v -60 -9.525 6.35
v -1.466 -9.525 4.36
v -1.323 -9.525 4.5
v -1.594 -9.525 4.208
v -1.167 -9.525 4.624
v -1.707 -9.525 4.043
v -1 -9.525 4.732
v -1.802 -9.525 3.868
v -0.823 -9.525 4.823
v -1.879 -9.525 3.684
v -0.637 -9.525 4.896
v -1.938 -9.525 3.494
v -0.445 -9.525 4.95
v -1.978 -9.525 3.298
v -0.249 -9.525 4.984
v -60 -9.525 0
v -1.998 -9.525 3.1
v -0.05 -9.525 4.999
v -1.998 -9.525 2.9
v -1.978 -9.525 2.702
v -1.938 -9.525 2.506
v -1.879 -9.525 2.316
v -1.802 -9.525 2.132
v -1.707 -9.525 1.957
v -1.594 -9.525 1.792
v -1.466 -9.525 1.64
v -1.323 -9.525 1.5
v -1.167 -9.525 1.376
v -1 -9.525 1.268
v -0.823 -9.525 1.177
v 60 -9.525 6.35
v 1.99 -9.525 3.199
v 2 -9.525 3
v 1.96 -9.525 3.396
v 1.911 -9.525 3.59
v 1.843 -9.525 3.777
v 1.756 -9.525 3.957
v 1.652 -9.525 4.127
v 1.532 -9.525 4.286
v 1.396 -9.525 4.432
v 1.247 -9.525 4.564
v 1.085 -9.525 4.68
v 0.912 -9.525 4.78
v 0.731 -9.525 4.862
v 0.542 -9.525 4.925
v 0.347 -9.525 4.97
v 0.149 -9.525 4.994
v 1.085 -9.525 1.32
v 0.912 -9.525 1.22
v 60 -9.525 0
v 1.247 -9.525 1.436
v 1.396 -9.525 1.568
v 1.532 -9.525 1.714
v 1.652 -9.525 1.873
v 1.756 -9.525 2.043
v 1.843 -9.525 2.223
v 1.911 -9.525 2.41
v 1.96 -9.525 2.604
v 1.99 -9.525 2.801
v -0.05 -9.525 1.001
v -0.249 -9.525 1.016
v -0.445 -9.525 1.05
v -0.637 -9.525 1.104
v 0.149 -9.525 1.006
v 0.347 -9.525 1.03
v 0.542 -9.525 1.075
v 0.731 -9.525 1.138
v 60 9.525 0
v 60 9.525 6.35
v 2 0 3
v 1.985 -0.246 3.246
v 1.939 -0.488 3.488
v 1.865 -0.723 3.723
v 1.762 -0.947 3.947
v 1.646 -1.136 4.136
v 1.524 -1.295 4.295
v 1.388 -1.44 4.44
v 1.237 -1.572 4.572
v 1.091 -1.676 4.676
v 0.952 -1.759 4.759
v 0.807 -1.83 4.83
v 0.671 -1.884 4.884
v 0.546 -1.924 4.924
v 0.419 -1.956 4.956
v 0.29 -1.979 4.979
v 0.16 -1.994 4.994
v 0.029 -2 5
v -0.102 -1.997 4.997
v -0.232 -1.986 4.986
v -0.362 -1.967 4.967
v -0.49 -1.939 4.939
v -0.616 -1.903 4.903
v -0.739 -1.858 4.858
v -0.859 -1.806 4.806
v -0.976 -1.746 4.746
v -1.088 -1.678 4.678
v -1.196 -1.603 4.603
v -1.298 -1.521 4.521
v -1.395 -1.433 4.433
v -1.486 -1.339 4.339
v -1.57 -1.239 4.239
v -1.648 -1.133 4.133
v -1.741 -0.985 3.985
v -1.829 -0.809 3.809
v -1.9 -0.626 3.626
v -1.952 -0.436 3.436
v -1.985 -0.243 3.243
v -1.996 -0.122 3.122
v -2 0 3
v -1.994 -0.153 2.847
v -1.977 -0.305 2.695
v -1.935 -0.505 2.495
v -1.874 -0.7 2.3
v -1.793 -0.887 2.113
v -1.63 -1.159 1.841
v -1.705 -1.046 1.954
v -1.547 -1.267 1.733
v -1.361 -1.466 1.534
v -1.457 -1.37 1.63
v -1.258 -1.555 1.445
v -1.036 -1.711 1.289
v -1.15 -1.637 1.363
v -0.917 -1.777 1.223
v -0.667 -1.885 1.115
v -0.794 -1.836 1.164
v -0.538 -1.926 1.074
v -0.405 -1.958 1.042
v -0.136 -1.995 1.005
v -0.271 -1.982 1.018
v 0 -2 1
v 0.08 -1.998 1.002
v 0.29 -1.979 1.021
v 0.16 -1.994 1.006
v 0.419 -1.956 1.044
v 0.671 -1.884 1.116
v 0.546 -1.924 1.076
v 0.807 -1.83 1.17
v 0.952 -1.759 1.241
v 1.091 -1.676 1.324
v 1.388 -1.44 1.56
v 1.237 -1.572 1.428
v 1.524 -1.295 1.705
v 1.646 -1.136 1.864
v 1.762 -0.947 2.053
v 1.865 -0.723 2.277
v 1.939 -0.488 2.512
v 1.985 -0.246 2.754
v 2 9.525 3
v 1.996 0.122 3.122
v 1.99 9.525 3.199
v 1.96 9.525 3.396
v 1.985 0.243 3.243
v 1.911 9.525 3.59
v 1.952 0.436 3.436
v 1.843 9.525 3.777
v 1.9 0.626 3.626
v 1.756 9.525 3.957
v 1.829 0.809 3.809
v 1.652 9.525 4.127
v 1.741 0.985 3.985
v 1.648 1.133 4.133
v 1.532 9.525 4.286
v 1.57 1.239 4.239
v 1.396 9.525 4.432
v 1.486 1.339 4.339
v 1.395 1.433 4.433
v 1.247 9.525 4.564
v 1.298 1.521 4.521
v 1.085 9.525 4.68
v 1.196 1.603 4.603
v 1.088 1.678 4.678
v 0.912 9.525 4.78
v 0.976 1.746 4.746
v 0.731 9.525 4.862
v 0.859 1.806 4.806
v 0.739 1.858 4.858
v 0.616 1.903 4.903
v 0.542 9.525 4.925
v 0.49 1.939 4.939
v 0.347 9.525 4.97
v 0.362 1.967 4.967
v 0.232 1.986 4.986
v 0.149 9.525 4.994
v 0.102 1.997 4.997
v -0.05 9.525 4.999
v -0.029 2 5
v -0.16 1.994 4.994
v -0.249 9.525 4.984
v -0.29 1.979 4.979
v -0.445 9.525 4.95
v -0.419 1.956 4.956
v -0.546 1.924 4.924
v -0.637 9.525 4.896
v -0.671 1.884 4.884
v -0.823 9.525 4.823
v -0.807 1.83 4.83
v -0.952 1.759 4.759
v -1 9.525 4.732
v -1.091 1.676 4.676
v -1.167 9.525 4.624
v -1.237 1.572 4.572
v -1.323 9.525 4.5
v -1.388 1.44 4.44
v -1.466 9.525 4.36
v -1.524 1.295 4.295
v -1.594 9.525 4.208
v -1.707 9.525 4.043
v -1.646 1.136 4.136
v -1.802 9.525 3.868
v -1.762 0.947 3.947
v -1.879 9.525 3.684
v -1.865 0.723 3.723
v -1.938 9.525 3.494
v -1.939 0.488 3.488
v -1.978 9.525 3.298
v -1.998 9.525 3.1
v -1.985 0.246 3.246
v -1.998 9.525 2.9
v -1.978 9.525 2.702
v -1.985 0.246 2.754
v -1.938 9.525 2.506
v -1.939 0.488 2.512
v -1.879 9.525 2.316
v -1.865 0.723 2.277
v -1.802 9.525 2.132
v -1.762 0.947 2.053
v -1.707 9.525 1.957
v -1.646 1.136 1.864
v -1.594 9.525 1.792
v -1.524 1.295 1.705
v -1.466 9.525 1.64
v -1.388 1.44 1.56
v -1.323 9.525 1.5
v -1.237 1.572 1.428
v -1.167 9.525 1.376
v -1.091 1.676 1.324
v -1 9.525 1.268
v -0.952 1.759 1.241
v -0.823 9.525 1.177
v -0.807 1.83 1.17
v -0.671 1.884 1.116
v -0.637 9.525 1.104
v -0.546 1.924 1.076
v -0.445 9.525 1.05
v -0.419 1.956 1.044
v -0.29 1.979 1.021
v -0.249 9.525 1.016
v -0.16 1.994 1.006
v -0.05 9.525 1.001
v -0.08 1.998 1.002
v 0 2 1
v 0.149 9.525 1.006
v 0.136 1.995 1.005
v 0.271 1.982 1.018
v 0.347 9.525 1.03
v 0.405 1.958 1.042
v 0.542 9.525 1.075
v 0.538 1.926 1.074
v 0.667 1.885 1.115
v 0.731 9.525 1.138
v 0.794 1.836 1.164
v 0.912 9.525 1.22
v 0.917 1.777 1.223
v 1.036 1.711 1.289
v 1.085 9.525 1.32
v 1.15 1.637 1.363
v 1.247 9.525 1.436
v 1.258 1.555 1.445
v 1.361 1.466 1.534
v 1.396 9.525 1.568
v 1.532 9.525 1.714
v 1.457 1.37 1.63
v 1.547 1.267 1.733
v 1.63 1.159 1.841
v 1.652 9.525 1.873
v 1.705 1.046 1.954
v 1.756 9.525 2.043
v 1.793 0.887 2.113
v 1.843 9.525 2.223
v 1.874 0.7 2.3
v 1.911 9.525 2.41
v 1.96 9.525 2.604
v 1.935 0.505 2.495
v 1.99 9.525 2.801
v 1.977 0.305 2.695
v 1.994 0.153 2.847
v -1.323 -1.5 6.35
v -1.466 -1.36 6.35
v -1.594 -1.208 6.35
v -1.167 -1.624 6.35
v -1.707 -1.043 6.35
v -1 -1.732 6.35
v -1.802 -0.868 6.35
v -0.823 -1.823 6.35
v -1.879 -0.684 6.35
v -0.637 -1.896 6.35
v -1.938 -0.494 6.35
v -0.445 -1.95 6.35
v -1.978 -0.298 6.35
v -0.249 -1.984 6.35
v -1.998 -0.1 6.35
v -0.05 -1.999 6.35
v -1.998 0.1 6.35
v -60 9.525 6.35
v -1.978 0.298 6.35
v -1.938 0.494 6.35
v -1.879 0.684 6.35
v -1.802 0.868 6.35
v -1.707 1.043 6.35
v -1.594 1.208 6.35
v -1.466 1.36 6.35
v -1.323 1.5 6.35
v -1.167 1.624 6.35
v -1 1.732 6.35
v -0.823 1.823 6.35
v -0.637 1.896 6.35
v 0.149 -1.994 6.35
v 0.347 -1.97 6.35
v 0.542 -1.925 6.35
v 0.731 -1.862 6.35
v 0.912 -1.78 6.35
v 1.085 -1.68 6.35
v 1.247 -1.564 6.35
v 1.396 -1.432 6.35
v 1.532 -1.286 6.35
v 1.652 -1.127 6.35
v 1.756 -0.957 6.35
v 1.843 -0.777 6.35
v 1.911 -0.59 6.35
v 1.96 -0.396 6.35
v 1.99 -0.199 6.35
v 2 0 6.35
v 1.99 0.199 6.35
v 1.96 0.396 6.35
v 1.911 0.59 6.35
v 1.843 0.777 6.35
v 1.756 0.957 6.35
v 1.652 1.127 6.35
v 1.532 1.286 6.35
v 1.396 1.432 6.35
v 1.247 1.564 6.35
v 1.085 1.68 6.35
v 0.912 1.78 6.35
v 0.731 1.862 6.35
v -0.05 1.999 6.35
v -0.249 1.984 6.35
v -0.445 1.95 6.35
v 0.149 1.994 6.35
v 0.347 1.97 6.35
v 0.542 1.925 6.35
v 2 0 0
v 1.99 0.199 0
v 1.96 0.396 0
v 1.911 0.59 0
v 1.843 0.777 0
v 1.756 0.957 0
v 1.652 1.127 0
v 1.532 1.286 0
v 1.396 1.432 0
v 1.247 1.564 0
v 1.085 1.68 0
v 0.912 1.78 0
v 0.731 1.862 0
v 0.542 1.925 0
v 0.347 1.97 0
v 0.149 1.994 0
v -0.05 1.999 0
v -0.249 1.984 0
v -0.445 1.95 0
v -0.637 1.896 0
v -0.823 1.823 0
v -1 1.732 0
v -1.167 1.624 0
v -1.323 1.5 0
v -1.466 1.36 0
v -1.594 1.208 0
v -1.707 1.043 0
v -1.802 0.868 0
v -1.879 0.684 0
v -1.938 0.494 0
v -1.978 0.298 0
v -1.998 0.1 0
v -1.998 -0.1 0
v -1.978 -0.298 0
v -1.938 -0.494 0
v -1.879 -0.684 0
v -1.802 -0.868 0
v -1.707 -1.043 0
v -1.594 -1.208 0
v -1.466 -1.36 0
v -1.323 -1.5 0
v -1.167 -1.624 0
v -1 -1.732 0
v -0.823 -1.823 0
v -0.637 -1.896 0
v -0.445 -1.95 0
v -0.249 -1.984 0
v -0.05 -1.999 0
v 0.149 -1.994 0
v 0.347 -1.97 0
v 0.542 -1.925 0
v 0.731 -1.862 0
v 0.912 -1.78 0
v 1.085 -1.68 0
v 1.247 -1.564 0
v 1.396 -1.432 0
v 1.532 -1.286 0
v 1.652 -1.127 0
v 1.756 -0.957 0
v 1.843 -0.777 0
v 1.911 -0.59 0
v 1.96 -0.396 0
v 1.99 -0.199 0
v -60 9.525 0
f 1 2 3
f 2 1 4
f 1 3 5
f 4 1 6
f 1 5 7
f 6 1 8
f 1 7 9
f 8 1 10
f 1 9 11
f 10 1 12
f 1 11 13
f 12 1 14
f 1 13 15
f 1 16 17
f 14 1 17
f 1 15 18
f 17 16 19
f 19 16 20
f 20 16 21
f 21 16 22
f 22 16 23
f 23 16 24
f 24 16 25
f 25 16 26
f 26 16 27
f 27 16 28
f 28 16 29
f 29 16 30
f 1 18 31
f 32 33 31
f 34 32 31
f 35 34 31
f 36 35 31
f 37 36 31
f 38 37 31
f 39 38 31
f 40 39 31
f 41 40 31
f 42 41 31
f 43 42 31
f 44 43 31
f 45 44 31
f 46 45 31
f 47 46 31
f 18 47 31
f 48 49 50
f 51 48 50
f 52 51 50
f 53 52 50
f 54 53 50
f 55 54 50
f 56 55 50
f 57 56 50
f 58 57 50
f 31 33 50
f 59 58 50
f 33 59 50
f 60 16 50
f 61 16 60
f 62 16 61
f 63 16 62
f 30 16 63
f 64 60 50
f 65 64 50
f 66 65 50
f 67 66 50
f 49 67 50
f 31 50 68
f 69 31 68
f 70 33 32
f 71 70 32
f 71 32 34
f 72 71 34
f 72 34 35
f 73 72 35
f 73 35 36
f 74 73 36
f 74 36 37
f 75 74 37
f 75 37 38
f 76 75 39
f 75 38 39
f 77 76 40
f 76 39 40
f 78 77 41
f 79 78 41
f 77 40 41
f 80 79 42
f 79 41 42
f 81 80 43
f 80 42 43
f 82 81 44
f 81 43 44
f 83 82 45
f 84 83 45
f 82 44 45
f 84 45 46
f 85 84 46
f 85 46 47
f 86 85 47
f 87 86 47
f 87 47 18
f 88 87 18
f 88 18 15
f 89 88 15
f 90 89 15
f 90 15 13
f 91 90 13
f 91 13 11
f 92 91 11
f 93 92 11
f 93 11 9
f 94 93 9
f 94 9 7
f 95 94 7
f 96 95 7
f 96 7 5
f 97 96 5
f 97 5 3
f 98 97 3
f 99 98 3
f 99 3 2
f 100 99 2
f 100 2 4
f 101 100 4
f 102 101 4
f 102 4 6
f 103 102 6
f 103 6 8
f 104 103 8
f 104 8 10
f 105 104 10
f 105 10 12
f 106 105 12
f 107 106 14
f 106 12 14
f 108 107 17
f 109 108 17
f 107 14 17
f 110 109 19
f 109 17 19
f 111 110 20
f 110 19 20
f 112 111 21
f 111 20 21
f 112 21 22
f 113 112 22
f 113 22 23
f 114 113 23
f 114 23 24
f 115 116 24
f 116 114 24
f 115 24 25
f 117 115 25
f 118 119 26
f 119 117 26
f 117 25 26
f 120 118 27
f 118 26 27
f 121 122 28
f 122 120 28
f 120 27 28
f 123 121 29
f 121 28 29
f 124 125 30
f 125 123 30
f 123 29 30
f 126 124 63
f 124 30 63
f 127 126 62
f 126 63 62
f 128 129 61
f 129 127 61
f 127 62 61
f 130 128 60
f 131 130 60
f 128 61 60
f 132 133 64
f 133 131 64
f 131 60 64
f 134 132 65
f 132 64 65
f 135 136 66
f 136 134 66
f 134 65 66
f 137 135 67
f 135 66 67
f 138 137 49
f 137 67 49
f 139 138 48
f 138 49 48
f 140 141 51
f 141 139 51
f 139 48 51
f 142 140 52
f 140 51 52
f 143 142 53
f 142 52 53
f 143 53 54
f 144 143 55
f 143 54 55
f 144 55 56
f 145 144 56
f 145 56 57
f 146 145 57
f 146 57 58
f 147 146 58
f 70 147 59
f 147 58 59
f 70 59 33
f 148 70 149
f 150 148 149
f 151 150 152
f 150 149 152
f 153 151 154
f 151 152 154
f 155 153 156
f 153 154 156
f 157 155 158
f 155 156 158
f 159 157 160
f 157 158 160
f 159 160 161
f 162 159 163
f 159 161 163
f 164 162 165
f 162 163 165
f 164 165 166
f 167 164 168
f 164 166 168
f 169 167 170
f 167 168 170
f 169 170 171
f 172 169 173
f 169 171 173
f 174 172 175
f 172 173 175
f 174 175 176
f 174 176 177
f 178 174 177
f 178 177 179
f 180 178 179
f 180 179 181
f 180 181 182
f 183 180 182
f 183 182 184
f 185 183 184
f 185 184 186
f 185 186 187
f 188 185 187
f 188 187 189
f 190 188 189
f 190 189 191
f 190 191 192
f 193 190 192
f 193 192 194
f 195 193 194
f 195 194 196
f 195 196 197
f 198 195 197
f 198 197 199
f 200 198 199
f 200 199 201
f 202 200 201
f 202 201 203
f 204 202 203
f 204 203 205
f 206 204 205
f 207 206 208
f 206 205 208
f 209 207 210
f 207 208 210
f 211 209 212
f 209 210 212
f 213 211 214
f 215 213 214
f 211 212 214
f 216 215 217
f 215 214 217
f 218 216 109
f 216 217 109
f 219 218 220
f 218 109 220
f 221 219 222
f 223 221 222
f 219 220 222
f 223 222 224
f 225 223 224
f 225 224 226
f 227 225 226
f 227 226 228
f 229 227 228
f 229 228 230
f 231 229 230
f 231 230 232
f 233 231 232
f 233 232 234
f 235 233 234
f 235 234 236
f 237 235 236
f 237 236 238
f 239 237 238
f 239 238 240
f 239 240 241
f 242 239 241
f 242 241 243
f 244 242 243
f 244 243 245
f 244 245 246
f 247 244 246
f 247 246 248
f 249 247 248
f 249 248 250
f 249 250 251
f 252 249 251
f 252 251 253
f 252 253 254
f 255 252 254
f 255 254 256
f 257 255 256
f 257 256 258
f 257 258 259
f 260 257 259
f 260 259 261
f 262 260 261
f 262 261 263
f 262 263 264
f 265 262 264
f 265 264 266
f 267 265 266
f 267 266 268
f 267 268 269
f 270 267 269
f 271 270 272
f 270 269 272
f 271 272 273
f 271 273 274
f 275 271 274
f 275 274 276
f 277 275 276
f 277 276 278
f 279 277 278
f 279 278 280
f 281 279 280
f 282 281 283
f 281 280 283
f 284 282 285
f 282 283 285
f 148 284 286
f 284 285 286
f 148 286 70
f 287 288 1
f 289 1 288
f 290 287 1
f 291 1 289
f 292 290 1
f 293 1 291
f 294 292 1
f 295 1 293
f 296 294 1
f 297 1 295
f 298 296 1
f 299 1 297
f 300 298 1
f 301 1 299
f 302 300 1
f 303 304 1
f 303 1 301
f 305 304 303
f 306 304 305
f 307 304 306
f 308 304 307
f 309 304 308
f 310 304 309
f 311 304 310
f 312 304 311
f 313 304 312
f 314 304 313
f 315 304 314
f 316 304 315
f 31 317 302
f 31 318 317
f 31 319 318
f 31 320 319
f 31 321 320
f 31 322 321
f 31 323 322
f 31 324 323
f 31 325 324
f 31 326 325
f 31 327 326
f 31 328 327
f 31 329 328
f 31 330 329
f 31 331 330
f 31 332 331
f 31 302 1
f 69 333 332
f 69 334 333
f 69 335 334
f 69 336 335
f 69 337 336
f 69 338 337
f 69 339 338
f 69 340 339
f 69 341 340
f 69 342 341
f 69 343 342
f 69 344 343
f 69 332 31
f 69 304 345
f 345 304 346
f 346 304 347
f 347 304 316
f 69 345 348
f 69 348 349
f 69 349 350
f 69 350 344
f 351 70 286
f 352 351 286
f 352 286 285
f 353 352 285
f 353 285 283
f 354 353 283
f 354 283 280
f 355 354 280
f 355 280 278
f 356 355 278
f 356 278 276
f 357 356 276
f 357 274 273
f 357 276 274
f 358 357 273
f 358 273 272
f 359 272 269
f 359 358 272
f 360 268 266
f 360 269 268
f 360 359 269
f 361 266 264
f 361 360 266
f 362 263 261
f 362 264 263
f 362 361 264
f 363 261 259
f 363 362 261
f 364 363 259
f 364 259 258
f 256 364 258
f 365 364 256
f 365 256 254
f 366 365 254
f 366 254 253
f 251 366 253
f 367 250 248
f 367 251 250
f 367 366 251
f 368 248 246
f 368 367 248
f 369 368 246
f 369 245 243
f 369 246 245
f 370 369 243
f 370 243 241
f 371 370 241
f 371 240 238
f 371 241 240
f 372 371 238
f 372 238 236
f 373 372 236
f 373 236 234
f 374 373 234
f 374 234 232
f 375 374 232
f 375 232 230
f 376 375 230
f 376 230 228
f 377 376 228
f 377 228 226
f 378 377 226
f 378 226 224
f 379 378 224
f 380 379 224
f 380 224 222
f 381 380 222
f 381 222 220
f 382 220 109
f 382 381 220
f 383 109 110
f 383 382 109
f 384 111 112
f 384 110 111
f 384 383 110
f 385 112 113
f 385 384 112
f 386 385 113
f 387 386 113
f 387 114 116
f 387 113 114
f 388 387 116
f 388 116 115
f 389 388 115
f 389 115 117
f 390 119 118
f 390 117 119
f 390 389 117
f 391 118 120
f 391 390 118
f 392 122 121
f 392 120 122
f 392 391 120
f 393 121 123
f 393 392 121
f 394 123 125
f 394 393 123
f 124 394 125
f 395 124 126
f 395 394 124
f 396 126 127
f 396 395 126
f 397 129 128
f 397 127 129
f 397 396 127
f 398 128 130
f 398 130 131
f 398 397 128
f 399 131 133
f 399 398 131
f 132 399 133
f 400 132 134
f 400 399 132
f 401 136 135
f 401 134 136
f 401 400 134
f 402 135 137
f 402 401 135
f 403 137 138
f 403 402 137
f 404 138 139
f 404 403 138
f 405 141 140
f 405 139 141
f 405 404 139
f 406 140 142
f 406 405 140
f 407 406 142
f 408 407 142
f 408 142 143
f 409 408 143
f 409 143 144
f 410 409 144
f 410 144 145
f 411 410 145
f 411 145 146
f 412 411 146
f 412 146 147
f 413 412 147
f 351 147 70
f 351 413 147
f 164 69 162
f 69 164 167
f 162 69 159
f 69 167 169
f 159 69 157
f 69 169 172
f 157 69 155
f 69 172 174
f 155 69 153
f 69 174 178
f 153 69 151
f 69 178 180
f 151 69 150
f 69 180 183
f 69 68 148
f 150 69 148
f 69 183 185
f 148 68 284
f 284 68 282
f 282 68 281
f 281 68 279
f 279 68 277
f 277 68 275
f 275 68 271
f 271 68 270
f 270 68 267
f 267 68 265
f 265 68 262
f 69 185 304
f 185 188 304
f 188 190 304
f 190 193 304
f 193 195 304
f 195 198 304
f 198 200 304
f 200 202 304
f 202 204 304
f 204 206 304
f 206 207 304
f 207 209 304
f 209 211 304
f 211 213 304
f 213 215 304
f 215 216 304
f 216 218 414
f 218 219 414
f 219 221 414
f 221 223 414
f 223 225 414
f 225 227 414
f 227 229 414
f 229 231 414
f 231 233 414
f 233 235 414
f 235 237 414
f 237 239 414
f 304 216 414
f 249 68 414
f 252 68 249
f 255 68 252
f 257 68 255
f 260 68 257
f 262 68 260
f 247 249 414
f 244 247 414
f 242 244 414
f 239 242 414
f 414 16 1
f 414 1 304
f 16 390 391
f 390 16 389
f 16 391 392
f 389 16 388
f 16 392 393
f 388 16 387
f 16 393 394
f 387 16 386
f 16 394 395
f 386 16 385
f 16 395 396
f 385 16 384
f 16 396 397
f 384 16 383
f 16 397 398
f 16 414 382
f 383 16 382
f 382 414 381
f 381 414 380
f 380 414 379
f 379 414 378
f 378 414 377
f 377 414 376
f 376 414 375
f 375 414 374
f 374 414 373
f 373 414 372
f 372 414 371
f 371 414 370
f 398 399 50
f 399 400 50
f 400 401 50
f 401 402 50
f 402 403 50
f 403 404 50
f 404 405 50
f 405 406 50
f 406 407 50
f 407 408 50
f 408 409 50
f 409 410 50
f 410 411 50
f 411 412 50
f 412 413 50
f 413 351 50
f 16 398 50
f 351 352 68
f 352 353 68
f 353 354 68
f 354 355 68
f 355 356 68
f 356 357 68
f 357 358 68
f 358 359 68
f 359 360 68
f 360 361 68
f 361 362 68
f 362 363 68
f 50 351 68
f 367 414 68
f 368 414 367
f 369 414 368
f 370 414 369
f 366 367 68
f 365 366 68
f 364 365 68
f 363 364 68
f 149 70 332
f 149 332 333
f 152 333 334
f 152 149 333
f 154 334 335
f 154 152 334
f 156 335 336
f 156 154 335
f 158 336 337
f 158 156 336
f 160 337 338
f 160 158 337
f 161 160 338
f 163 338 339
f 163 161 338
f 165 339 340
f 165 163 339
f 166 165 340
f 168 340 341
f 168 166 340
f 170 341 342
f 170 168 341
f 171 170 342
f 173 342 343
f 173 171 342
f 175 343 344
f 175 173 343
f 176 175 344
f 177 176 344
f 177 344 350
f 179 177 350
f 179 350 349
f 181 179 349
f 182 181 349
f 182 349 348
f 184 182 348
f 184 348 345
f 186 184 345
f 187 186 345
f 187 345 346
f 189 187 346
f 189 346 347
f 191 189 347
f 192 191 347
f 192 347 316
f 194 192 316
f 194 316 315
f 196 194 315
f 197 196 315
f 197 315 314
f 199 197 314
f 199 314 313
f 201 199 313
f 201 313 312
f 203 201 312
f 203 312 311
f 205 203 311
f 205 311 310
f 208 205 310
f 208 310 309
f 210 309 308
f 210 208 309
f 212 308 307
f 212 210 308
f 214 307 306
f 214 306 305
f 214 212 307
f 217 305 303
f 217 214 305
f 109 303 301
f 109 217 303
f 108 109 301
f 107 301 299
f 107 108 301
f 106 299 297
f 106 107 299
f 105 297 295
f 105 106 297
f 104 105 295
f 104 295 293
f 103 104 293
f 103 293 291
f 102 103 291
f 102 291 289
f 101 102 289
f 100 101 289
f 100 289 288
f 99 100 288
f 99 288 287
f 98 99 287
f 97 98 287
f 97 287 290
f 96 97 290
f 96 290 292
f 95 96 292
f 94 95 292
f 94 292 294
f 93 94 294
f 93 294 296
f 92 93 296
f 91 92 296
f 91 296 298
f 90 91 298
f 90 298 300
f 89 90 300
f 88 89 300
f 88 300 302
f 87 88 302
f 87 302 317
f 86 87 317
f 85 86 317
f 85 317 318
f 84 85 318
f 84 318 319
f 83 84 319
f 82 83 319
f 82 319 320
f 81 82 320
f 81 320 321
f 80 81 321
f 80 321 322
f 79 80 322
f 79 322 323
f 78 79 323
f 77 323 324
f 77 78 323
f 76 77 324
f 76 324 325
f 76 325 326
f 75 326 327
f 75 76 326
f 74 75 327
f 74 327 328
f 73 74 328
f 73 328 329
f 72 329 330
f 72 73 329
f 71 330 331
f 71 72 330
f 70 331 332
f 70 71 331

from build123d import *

# Parameters (mm, degrees)
F0_W     = 55
F0_H     = 19.05
F0_W_2   = 10
F0_R     = 2
F1_DEPTH = 6.35
F2_R     = 2
F3_DEPTH = 19.051


with BuildPart() as f1:
    # F0 (on Top) → F1 (new body)
    with BuildSketch(Plane.XY):
        with Locations((32.5, 0)):
            Rectangle(F0_W, F0_H)
        Rectangle(F0_W_2, F0_H)
        Circle(F0_R, mode=Mode.SUBTRACT)
        with Locations((-32.5, 0)):
            Rectangle(F0_W, F0_H)
    extrude(amount=F1_DEPTH)

    # F2 (on face) → F3 (cut, through all)
    with BuildSketch(Plane.XZ.offset(9.525)):
        with Locations((0, 3)):
            Circle(F2_R)
    extrude(amount=-F3_DEPTH, mode=Mode.SUBTRACT)


solid = f1.part
